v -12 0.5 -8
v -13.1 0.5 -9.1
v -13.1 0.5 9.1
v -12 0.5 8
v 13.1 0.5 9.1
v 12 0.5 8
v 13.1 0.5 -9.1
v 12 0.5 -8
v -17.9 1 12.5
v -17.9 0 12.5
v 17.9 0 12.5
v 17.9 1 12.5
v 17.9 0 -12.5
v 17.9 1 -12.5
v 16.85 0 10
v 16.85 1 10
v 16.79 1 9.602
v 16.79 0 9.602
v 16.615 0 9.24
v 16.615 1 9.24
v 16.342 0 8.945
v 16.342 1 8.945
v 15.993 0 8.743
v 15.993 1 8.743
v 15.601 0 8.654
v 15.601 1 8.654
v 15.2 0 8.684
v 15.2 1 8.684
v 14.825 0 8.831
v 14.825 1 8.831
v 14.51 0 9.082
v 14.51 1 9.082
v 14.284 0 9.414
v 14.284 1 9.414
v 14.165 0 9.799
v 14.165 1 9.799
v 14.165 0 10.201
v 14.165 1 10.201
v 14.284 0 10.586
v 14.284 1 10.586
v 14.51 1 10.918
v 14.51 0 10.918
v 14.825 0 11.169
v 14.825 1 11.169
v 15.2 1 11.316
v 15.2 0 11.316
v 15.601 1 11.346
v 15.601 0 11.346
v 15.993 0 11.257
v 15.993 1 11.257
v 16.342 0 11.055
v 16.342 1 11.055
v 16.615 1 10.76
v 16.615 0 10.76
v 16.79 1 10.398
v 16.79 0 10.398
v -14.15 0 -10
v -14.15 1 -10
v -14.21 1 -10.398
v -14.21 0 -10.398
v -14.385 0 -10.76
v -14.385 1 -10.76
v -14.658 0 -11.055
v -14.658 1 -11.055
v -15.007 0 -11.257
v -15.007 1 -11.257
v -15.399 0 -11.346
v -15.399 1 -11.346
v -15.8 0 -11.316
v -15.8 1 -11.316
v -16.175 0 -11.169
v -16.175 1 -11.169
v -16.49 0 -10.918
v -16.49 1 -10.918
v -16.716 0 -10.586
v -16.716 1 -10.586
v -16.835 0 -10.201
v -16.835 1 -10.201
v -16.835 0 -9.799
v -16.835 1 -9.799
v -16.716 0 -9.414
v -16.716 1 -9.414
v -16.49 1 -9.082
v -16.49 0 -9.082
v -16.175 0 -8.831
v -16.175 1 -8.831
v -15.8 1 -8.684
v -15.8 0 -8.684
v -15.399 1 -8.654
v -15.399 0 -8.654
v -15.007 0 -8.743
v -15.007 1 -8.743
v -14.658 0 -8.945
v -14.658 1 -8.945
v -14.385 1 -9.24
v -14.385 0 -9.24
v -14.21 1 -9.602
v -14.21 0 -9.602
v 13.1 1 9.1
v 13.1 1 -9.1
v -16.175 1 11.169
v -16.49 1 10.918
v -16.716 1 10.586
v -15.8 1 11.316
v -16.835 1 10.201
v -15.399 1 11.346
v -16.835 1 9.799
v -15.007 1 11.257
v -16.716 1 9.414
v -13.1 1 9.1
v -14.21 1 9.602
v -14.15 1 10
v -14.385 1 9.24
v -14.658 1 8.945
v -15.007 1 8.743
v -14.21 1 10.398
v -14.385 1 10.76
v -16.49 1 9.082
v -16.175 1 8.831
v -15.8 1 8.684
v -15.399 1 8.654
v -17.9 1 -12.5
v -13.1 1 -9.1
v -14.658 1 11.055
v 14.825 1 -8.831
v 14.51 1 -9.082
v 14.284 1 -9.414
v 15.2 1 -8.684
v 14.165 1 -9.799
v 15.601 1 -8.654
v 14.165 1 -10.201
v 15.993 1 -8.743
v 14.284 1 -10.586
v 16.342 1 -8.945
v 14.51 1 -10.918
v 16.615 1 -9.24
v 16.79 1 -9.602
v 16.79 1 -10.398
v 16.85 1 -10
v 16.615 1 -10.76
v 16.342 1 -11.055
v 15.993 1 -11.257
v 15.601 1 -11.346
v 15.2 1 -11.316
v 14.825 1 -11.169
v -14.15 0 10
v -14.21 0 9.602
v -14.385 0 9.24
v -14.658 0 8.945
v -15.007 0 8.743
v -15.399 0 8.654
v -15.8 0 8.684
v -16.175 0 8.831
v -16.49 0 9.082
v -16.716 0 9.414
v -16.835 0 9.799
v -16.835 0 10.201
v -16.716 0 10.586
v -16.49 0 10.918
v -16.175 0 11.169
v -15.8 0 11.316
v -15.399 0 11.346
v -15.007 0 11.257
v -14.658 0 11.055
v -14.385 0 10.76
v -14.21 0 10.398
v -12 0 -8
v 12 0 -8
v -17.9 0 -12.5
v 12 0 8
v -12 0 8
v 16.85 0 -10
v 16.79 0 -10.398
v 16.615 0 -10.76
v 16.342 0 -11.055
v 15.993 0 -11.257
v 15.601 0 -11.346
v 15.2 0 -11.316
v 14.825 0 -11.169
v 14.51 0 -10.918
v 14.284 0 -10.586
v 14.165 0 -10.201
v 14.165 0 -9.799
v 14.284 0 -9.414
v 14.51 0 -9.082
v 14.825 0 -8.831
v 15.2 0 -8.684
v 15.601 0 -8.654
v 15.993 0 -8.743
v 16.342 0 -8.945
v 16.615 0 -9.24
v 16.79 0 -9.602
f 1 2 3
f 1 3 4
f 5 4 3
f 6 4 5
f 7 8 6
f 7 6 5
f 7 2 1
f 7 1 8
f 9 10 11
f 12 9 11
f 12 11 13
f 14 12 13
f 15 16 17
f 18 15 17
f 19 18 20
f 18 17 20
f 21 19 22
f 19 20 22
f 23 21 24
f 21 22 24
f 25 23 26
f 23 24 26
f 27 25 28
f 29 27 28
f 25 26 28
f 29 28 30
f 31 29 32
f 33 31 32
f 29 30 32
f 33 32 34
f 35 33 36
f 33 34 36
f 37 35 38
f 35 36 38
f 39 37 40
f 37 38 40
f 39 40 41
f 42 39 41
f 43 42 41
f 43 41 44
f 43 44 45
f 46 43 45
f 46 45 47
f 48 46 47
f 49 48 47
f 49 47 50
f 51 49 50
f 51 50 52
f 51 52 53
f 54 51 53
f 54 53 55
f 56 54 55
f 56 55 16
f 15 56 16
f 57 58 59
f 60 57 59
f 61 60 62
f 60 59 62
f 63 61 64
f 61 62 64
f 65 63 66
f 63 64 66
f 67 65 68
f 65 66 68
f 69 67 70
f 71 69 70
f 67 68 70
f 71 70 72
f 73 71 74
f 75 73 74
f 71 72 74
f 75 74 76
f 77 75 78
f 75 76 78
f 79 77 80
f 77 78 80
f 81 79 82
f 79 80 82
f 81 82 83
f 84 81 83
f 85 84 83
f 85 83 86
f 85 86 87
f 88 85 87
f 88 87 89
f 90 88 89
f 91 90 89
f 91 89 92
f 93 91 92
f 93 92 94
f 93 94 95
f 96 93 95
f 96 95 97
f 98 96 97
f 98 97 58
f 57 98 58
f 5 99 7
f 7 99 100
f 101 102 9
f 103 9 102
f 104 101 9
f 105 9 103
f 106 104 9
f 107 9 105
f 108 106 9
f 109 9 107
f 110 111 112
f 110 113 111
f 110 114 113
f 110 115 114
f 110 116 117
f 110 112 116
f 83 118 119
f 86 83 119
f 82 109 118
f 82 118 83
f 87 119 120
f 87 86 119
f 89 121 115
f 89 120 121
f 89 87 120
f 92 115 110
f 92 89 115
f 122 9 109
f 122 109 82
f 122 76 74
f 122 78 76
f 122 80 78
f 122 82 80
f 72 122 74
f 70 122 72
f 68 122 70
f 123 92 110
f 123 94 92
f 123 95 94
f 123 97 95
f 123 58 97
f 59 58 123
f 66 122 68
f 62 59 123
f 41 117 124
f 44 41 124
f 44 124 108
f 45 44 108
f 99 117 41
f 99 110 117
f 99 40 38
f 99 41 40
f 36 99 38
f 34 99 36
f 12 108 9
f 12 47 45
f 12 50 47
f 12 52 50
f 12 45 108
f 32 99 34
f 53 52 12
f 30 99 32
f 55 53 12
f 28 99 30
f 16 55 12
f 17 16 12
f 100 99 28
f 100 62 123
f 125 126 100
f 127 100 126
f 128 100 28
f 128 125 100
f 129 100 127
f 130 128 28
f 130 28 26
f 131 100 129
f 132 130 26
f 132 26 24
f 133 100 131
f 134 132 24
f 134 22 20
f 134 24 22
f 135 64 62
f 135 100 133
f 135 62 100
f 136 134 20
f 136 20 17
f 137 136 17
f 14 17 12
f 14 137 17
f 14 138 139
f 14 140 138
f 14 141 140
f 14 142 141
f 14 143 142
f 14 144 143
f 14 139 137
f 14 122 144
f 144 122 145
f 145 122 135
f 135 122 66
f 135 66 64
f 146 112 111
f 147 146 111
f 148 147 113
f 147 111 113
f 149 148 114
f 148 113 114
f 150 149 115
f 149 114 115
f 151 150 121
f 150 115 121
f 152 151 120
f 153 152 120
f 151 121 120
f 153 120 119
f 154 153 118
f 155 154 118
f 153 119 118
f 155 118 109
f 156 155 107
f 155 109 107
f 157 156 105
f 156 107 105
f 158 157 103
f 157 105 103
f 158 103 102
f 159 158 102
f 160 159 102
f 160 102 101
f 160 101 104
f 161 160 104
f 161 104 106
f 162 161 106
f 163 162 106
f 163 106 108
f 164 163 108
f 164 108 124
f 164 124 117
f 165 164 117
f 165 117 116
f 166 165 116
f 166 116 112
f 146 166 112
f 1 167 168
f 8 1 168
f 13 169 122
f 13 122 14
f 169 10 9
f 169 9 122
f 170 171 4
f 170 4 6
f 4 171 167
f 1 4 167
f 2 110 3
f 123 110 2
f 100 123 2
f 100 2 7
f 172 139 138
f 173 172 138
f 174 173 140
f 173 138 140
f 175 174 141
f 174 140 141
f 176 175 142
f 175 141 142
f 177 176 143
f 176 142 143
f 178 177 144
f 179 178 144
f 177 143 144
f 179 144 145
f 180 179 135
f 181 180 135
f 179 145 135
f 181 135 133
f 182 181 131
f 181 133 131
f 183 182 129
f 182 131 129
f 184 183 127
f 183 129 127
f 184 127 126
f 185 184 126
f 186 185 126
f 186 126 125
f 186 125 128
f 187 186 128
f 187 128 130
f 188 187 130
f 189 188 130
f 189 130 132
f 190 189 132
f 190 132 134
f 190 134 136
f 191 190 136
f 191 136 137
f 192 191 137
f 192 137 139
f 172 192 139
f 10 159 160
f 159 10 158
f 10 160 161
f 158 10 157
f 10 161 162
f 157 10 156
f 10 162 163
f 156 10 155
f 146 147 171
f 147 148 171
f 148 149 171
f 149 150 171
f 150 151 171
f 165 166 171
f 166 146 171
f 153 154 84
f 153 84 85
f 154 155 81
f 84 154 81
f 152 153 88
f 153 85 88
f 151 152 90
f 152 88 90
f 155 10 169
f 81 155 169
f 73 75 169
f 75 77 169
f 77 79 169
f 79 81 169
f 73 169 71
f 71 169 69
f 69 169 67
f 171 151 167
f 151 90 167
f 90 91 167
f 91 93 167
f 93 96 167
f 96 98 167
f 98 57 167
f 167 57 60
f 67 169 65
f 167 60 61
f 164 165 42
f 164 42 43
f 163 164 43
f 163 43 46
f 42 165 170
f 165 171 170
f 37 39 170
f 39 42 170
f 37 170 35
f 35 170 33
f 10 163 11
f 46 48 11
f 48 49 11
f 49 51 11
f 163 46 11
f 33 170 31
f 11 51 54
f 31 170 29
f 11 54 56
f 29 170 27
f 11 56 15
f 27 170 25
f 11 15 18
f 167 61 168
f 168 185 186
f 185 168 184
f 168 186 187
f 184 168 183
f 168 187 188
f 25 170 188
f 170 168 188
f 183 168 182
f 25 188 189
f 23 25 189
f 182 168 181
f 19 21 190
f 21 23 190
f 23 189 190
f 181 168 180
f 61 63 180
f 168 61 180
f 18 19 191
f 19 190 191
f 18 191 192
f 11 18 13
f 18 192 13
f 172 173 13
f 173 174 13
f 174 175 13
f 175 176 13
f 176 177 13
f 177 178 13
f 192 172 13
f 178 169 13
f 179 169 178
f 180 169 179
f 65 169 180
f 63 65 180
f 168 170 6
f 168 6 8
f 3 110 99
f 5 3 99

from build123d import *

# Parameters (mm, degrees)
SKETCH1_W           = 35.8
SKETCH1_H           = 25
SKETCH1_W_2         = 24
SKETCH1_H_2         = 16
BOSS_EXTRUDE1_DEPTH = 1
SKETCH2_W           = 26.2
SKETCH2_H           = 18.2
CUT_EXTRUDE1_DEPTH  = 0.5
CUT_EXTRUDE2_REACH  = 3
SKETCH3_R           = 1.35


with BuildPart() as part:
    # Sketch1 → Boss-Extrude1 (new body)
    with BuildSketch(Plane(origin=(0, 0, 0), x_dir=(1, 0, 0), z_dir=(0, 1, 0))):
        Rectangle(SKETCH1_W, SKETCH1_H)
        Rectangle(SKETCH1_W_2, SKETCH1_H_2, mode=Mode.SUBTRACT)
    extrude(amount=BOSS_EXTRUDE1_DEPTH)

    # Sketch2 → Cut-Extrude1 (cut)
    with BuildSketch(Plane(origin=(0, 1, 0), x_dir=(1, 0, 0), z_dir=(0, 1, 0))):
        Rectangle(SKETCH2_W, SKETCH2_H)
    extrude(amount=-CUT_EXTRUDE1_DEPTH, mode=Mode.SUBTRACT)

    # Sketch3 → Cut-Extrude2 (cut, up to next)
    with BuildSketch(Plane(origin=(0, 1, 0), x_dir=(1, 0, 0), z_dir=(0, 1, 0)), mode=Mode.PRIVATE) as cut_extrude2_sk1:
        with Locations((-15.5, 10)):
            Circle(SKETCH3_R)
    cut_extrude2_tool1 = extrude(cut_extrude2_sk1.sketch, amount=-CUT_EXTRUDE2_REACH, mode=Mode.PRIVATE) & part.part
    add(cut_extrude2_tool1.solids().sort_by_distance((-15.5, 1, -10))[0], mode=Mode.SUBTRACT)
    # Sketch3 → Cut-Extrude2 (cut, up to next)
    with BuildSketch(Plane(origin=(0, 1, 0), x_dir=(1, 0, 0), z_dir=(0, 1, 0)), mode=Mode.PRIVATE) as cut_extrude2_sk2:
        with Locations((-15.5, -10)):
            Circle(SKETCH3_R)
    cut_extrude2_tool2 = extrude(cut_extrude2_sk2.sketch, amount=-CUT_EXTRUDE2_REACH, mode=Mode.PRIVATE) & part.part
    add(cut_extrude2_tool2.solids().sort_by_distance((-15.5, 1, 10))[0], mode=Mode.SUBTRACT)
    # Sketch3 → Cut-Extrude2 (cut, up to next)
    with BuildSketch(Plane(origin=(0, 1, 0), x_dir=(1, 0, 0), z_dir=(0, 1, 0)), mode=Mode.PRIVATE) as cut_extrude2_sk3:
        with Locations((15.5, -10)):
            Circle(SKETCH3_R)
    cut_extrude2_tool3 = extrude(cut_extrude2_sk3.sketch, amount=-CUT_EXTRUDE2_REACH, mode=Mode.PRIVATE) & part.part
    add(cut_extrude2_tool3.solids().sort_by_distance((15.5, 1, 10))[0], mode=Mode.SUBTRACT)
    # Sketch3 → Cut-Extrude2 (cut, up to next)
    with BuildSketch(Plane(origin=(0, 1, 0), x_dir=(1, 0, 0), z_dir=(0, 1, 0)), mode=Mode.PRIVATE) as cut_extrude2_sk4:
        with Locations((15.5, 10)):
            Circle(SKETCH3_R)
    cut_extrude2_tool4 = extrude(cut_extrude2_sk4.sketch, amount=-CUT_EXTRUDE2_REACH, mode=Mode.PRIVATE) & part.part
    add(cut_extrude2_tool4.solids().sort_by_distance((15.5, 1, -10))[0], mode=Mode.SUBTRACT)


solid = part.part
